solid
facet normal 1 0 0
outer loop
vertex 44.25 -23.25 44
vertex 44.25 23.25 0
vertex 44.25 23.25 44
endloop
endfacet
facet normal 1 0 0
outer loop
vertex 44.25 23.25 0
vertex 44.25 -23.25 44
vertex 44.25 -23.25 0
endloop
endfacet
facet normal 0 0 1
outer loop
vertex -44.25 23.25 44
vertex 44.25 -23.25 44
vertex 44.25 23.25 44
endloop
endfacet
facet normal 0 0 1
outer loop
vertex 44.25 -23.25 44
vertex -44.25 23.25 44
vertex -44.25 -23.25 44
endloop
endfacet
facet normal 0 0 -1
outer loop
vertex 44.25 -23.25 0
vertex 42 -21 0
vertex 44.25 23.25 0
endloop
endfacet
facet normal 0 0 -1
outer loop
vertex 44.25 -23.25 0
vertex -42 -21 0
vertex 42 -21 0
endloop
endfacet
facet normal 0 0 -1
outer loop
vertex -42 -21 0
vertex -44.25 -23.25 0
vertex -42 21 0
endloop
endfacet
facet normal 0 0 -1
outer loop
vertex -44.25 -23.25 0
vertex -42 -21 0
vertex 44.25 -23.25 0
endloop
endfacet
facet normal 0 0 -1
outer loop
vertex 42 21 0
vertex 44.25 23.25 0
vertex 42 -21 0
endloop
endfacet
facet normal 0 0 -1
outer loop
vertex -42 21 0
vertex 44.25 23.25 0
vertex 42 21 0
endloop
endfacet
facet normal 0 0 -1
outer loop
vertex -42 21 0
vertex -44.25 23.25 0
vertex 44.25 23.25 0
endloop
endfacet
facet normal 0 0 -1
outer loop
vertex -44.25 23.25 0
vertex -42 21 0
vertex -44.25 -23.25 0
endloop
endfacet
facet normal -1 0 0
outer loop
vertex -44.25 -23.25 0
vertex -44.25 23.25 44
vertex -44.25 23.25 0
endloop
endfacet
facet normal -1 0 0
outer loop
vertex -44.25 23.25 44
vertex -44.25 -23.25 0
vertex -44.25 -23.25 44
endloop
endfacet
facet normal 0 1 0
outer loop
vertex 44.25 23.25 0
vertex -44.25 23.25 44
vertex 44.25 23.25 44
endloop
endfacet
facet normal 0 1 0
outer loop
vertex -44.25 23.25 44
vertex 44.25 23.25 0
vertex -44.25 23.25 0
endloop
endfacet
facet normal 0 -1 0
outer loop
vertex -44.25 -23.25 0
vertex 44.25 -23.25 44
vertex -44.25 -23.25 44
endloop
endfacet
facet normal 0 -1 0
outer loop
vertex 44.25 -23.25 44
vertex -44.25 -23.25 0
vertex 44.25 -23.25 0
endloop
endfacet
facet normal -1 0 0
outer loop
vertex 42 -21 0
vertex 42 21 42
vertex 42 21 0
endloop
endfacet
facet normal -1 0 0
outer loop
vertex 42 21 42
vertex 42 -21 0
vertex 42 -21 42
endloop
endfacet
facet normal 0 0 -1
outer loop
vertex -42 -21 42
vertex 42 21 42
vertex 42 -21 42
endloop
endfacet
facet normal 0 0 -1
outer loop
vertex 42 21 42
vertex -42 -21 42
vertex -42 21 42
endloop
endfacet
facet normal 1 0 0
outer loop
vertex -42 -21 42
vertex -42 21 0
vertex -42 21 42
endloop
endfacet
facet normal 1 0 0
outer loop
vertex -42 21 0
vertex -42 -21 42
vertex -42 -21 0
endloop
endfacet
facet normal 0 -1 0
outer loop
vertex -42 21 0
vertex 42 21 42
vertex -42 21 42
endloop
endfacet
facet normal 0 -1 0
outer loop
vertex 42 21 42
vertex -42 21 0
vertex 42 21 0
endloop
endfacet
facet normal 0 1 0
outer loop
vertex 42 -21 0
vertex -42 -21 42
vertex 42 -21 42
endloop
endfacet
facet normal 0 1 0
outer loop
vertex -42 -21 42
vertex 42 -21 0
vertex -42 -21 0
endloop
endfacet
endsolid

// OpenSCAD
// file: ../lib/gridfinity.scad
// gridfinity.scad — shared Gridfinity baseplate + bin library (per spec).
//
// 42 mm pitch, 41.5 mm bins, baseplate socket 0.7/1.8/2.15 = 4.65 mm, 4 mm
// fillet; bin foot 0.8/1.8/2.15 = 4.75 mm, 3.75 mm corner radius. Verified the
// bin foot seats in the baseplate socket with ~0.25–0.5 mm clearance.
//
//   baseplate(nx, ny)                      — tiled receiving baseplate
//   bin_blank(nx, ny, h)                   — solid bin body (feet + block, no cavity)
//   bin(nx, ny, h, wall, floor)            — open Gridfinity bin
//   divided_bin(nx, ny, h, cols, rows, …)  — bin with internal compartments
//   lid(nx, ny, …)                         — friction lid for a bin of the same footprint
//   stack_base(nx, ny, h, …)               — baseplate-topped base; a bin socket-stacks on it

GF = 42; GF_FILLET = 4;
_C_TOP = 2.15; _C_MID = 1.8; _C_BOT = 0.7;
_BP_LIP = _C_TOP + _C_MID + _C_BOT; _BP_FLOOR = 1.2; BP_H = _BP_LIP + _BP_FLOOR;  // 5.85
BIN_SZ = 41.5; BIN_R = 3.75; BIN_BASE_H = 4.75;

// ---- baseplate ----
module _bp_cell(i = 0) { offset(r = -i) offset(r = GF_FILLET) offset(r = -GF_FILLET) square(GF, center = true); }
module _bp_socket() {
    e = 0.01;
    hull() { translate([0,0,BP_H-e]) linear_extrude(e) _bp_cell(0); translate([0,0,BP_H-_C_TOP]) linear_extrude(e) _bp_cell(_C_TOP); }
    translate([0,0,BP_H-_C_TOP-_C_MID]) linear_extrude(_C_MID) _bp_cell(_C_TOP);
    hull() { translate([0,0,BP_H-_C_TOP-_C_MID-e]) linear_extrude(e) _bp_cell(_C_TOP); translate([0,0,BP_H-_BP_LIP]) linear_extrude(e) _bp_cell(_C_TOP+_C_BOT); }
}
module baseplate(nx, ny) {
    w = nx*GF; d = ny*GF;
    difference() {
        translate([0,0,BP_H/2]) linear_extrude(BP_H, center=true) offset(GF_FILLET) offset(-GF_FILLET) square([w,d], center=true);
        for (ix=[0:nx-1], iy=[0:ny-1]) translate([(ix-(nx-1)/2)*GF, (iy-(ny-1)/2)*GF, 0]) _bp_socket();
    }
}

// ---- bin ----
module _bin_cell(i = 0) { offset(r = -i) offset(r = BIN_R) offset(r = -BIN_R) square(BIN_SZ, center = true); }
module _bin_foot() {
    e = 0.01;
    hull() { linear_extrude(e) _bin_cell(2.95); translate([0,0,0.8]) linear_extrude(e) _bin_cell(2.15); }    // bottom chamfer
    translate([0,0,0.8]) linear_extrude(1.8) _bin_cell(2.15);                                                 // vertical
    hull() { translate([0,0,2.6]) linear_extrude(e) _bin_cell(2.15); translate([0,0,BIN_BASE_H]) linear_extrude(e) _bin_cell(0); } // top chamfer
}
// Solid bin body: Gridfinity feet + the block above them, with no cavity cut.
// Cup-style bins (lib/vessel.scad) subtract their own bores from this instead of
// re-deriving the foot + shell union.
module bin_blank(nx, ny, h) {
    W = nx*GF - 0.5; D = ny*GF - 0.5;
    union() {
        for (ix=[0:nx-1], iy=[0:ny-1]) translate([(ix-(nx-1)/2)*GF, (iy-(ny-1)/2)*GF, 0]) _bin_foot();
        translate([0,0,BIN_BASE_H]) linear_extrude(h-BIN_BASE_H) offset(BIN_R) offset(-BIN_R) square([W,D], center=true);
    }
}

module _bin_shell(nx, ny, h, wall, floor) {
    W = nx*GF - 0.5; D = ny*GF - 0.5;
    difference() {
        bin_blank(nx, ny, h);
        translate([0,0,BIN_BASE_H+floor]) linear_extrude(h) offset(BIN_R-wall) offset(-(BIN_R-wall)) square([W-2*wall, D-2*wall], center=true);
    }
}
module bin(nx, ny, h, wall = 1.2, floor = 1.4) { _bin_shell(nx, ny, h, wall, floor); }

// ---- stacking base ----
// A bin whose TOP is a Gridfinity baseplate, so a standard bin socket-stacks on
// it (two-tier towers: instrument on top, cords/jig/adapters in the base). The
// base is open at the FRONT (−Y) by default so the lower item is reachable while
// the top tier stays socketed — same idea as drybox-splitter-stand's open cubby.
// The whole tower foots on the bench baseplate via this base's own foot.
//
//   h = interior height of the lower compartment (floor to the baseplate cap).
module stack_base(nx, ny, h, wall = 1.2, floor = 1.4, open_front = true) {
    W = nx*GF - 0.5; D = ny*GF - 0.5;
    z0 = BIN_BASE_H + floor;
    iw = W - 2*wall; id = D - 2*wall;
    difference() {
        union() {
            bin_blank(nx, ny, h);                    // solid foot + block to h
            translate([0,0,h]) baseplate(nx, ny);    // baseplate cap (sockets up)
        }
        // lower cavity, floor up to the cap underside
        translate([0,0,z0]) linear_extrude(h - z0 + 0.01)
            offset(BIN_R-wall) offset(-(BIN_R-wall)) square([iw, id], center=true);
        // open front: cut the −Y wall so you reach in under the cap
        if (open_front)
            translate([-iw/2, -D, z0]) cube([iw, D/2 + 0.01, h - z0 + 0.01]);
    }
}

module divided_bin(nx, ny, h, cols = 1, rows = 1, wall = 1.2, floor = 1.4, div = 1.2) {
    W = nx*GF - 0.5; D = ny*GF - 0.5;
    union() {
        bin(nx, ny, h, wall, floor);
        // internal divider walls (from the floor up to the rim)
        iw = W - 2*wall; id = D - 2*wall; z0 = BIN_BASE_H + floor;
        for (c = [1 : cols-1]) translate([-iw/2 + c*iw/cols - div/2, -id/2, z0]) cube([div, id, h - z0]);
        for (r = [1 : rows-1]) translate([-iw/2, -id/2 + r*id/rows - div/2, z0]) cube([iw, div, h - z0]);
    }
}

// ---- lid ----
// Friction lid for a bin of the same footprint: a flat plate with a skirt that
// drops into the bin's cavity. Emitted PRINT-READY — plate on the bed, skirt
// standing up — so it needs no supports. Flip it in your head to picture it
// fitted: the plate then caps the rim and the lid adds `t` to the stack height.
//
// Why lids exist here: full-extension drawer slides let small parts hop between
// compartments on a hard close, and brass inserts aren't magnetic — you can't
// sweep them back. `wall` must match the bin's wall so the skirt lands in the
// cavity; `clearance` is per-side slop between skirt and cavity.
module lid(nx, ny, t = 1.6, skirt = 4, wall = 1.2, clearance = 0.35, lid_wall = 1.6) {
    W = nx*GF - 0.5; D = ny*GF - 0.5;
    iw = W - 2*wall - 2*clearance; id = D - 2*wall - 2*clearance;   // skirt outer
    ir = BIN_R - wall;                                              // cavity corner radius
    union() {
        linear_extrude(t) offset(BIN_R) offset(-BIN_R) square([W, D], center=true);
        translate([0,0,t]) linear_extrude(skirt) difference() {
            offset(ir) offset(-ir) square([iw, id], center=true);
            offset(ir-lid_wall) offset(-(ir-lid_wall)) square([iw-2*lid_wall, id-2*lid_wall], center=true);
        }
    }
}
// file: ../lib/vessel.scad
// vessel.scad — parametric collar cups for bottles, cans, and pen-form tools.
//
// A collar cup is a solid Gridfinity block with cylindrical bores sunk into it.
// It LOCATES a vessel; it does not clamp one. That distinction is the whole
// design: a collar that grips harder than the bin weighs comes out of the
// baseplate with the bottle when you grab it one-handed. Clearance, not
// interference — CLR is per-diameter, not per-side.
//
// Capture depth is roughly a third of the vessel's height. Enough to resist a
// knock (this bench sits under a 180 W fume-extractor intake), not so much that
// you're fishing the bottle out.
//
//   collar_cup(nx, ny, vessel_d, capture_h, …)   — one centred bore
//   collar_cup_multi(nx, ny, bores, capture_h, …) — bores = [[x, y, d], …]
//
// Cord slot: pen-form tools that stand in a cup are usually corded (the HARDELL
// rotary tool takes a barrel jack). Without a slot the lead drapes over the rim
// and levers the tool sideways. `cord_w > 0` cuts a channel from the bore out
// through the wall, open to the top.

include <gridfinity.scad>

CLR      = 1.0;   // bore = vessel_d + CLR. Loose on purpose — see above.
MIN_WALL = 1.2;   // minimum material between two bores, and bore to outer face

// ---- geometry guards ----
// Overlapping bores and bores that break out through the side wall both still
// render as perfectly watertight, 2-manifold meshes — CI cannot tell you the
// part is wrong, only that it is closed. These asserts encode the intent that
// the mesh check can't. Cheap, and they fire at render time rather than on the
// printer.
function _pair_gaps(bores, clr) = [
    for (i = [0 : len(bores)-1], j = [0 : len(bores)-1]) if (i < j)
        norm([bores[i][0]-bores[j][0], bores[i][1]-bores[j][1]])
        - (bores[i][2]+clr)/2 - (bores[j][2]+clr)/2
];
function _edge_gaps(bores, clr, W, D) = [
    for (b = bores) min(W/2 - abs(b[0]) - (b[2]+clr)/2,
                        D/2 - abs(b[1]) - (b[2]+clr)/2)
];

// Multi-bore block. Bores are [x, y, diameter] in mm, relative to the block centre.
module collar_cup_multi(nx, ny, bores, capture_h, floor = 1.4, clr = CLR,
                        cord_w = 0, cord_at = 0, min_wall = MIN_WALL) {
    h = BIN_BASE_H + floor + capture_h;
    e = 0.1;
    W = nx*GF - 0.5; D = ny*GF - 0.5;
    _pg = _pair_gaps(bores, clr);
    _eg = _edge_gaps(bores, clr, W, D);
    assert(len(_pg) == 0 || min(_pg) >= min_wall,
           "collar_cup: bores are too close — they would merge into one pocket");
    assert(min(_eg) >= min_wall,
           "collar_cup: a bore breaches the outer wall — block needs more units");
    difference() {
        bin_blank(nx, ny, h);
        for (b = bores)
            translate([b[0], b[1], BIN_BASE_H + floor])
                cylinder(d = b[2] + clr, h = capture_h + e, $fn = 96);
        // Cord channel: from the first bore outward through the +X wall, open to
        // the rim so the lead drops in from above rather than threading.
        if (cord_w > 0)
            translate([bores[0][0], bores[0][1] - cord_w/2, BIN_BASE_H + floor + cord_at])
                cube([nx*GF, cord_w, h]);
    }
}

// Single centred bore — the common case.
module collar_cup(nx, ny, vessel_d, capture_h, floor = 1.4, clr = CLR,
                  cord_w = 0, cord_at = 0, min_wall = MIN_WALL) {
    collar_cup_multi(nx, ny, [[0, 0, vessel_d]], capture_h, floor, clr,
                     cord_w, cord_at, min_wall);
}

// Evenly spaced row of same-depth bores along X — for a rank of aerosol cans.
// Returns geometry, not a list; pass the diameters and it lays them out on the
// block's centre line.
module collar_cup_row(nx, ny, diameters, capture_h, floor = 1.4, clr = CLR,
                      min_wall = MIN_WALL) {
    n = len(diameters);
    pitch = nx * GF / n;
    collar_cup_multi(nx, ny,
        [for (i = [0 : n-1]) [(i - (n-1)/2) * pitch, 0, diameters[i]]],
        capture_h, floor, clr, 0, 0, min_wall);
}
// file: ../lib/syringe.scad
// syringe.scad — bore-grid racks: a Gridfinity block drilled with a 2D array of
// vertical holes. Syringes, barrel tips, rotary burrs — same form, different
// numbers.
//
// This is a layout helper over collar_cup_multi(), not new geometry. The bores
// are VERTICAL: no overhangs to print, densest packing, shortest block. Tilting
// them toward the user reads better and plucks easier, but costs all three —
// revisit only if upright proves annoying in practice.
//
// Bore depth is a CAPTURE depth, not the item's length. A 125 mm syringe in a
// 35 mm bore stands like a pen in a cup; the block doesn't grow to swallow it.
//
//   bore_grid(cols, rows, d, px, py)          — position list, for composing
//   syringe_rack(nx, ny, cols, rows, d, …)    — the finished rack
//
// Auto-pitch: with pitch = nx*GF/cols and the grid centred, the margin from the
// outermost bore's centre to the block edge is exactly pitch/2 — so a single
// condition, pitch >= bore + 2*min_wall, guards BOTH inter-bore webs and the
// outer wall. That's what the assert below checks. It is not decoration: a
// plausible-looking spec (10 mm syringes, 6 across a 2-unit block) leaves a
// 0.84 mm outer wall, which you would otherwise find out about on the printer.

include <vessel.scad>

SYR_CLR      = 1.0;   // bore = syringe_d + SYR_CLR (per diameter, not per side)
SYR_MIN_WALL = 1.2;   // minimum web between bores, and bore to outer face

// Bore centres for a cols × rows grid, centred on the origin.
function bore_grid(cols, rows, d, px, py) =
    [for (c = [0 : cols-1], r = [0 : rows-1])
        [(c - (cols-1)/2) * px, (r - (rows-1)/2) * py, d]];

// Rack of identical bores. pitch_x / pitch_y default to an even spread across
// the block footprint; pass them explicitly to pack tighter and leave a margin.
module syringe_rack(nx, ny, cols, rows, syringe_d, capture_h = 35,
                    floor = 1.4, clr = SYR_CLR, min_wall = SYR_MIN_WALL,
                    pitch_x = 0, pitch_y = 0) {
    px   = pitch_x > 0 ? pitch_x : nx * GF / cols;
    py   = pitch_y > 0 ? pitch_y : ny * GF / rows;
    bore = syringe_d + clr;

    assert(px >= bore + 2 * min_wall,
           "syringe_rack: too many columns — bores would merge or breach the outer wall");
    assert(py >= bore + 2 * min_wall,
           "syringe_rack: too many rows — bores would merge or breach the outer wall");

    collar_cup_multi(nx, ny, bore_grid(cols, rows, syringe_d, px, py),
                     capture_h, floor, clr);
}
// file: uv_mask_common.scad
// uv_mask_common — deep-bore, capped rack for UV-curable mask syringes.
// The mask cures under 365 nm, so ambient light skins it. Syringes sit TIP-DOWN
// in deep opaque bores (tip + most of the barrel shielded); an opaque CAP covers
// the stubs that stick up. Print BOTH in opaque filament (not clear/natural).
include <../lib/syringe.scad>
UVM_D      = 10.8;   // 10 cc syringe barrel
UVM_COLS   = 4; UVM_ROWS = 2;   // 8 slots (holds 7: 2 green + 5 others)
UVM_DEPTH  = 65;     // bore depth — swallows the tip + most of a ~100 mm syringe
UVM_NX = 2; UVM_NY = 1;

// Cap that slides over the block top, covering the protruding syringe stubs.
module uvm_cap() {
    W = UVM_NX*GF - 0.5; D = UVM_NY*GF - 0.5;
    clr = 0.5; wall = 2.5; top = 2; h = 42;
    difference() {
        translate([-(W+2*wall)/2, -(D+2*wall)/2, 0]) cube([W+2*wall, D+2*wall, h+top]);
        translate([-(W+clr)/2, -(D+clr)/2, -0.1]) cube([W+clr, D+clr, h+0.1]);
    }
}
// main file
// uv_mask_cap — opaque cap over the stubs (print opaque; open side down = no supports).
include <uv_mask_common.scad>
uvm_cap();
